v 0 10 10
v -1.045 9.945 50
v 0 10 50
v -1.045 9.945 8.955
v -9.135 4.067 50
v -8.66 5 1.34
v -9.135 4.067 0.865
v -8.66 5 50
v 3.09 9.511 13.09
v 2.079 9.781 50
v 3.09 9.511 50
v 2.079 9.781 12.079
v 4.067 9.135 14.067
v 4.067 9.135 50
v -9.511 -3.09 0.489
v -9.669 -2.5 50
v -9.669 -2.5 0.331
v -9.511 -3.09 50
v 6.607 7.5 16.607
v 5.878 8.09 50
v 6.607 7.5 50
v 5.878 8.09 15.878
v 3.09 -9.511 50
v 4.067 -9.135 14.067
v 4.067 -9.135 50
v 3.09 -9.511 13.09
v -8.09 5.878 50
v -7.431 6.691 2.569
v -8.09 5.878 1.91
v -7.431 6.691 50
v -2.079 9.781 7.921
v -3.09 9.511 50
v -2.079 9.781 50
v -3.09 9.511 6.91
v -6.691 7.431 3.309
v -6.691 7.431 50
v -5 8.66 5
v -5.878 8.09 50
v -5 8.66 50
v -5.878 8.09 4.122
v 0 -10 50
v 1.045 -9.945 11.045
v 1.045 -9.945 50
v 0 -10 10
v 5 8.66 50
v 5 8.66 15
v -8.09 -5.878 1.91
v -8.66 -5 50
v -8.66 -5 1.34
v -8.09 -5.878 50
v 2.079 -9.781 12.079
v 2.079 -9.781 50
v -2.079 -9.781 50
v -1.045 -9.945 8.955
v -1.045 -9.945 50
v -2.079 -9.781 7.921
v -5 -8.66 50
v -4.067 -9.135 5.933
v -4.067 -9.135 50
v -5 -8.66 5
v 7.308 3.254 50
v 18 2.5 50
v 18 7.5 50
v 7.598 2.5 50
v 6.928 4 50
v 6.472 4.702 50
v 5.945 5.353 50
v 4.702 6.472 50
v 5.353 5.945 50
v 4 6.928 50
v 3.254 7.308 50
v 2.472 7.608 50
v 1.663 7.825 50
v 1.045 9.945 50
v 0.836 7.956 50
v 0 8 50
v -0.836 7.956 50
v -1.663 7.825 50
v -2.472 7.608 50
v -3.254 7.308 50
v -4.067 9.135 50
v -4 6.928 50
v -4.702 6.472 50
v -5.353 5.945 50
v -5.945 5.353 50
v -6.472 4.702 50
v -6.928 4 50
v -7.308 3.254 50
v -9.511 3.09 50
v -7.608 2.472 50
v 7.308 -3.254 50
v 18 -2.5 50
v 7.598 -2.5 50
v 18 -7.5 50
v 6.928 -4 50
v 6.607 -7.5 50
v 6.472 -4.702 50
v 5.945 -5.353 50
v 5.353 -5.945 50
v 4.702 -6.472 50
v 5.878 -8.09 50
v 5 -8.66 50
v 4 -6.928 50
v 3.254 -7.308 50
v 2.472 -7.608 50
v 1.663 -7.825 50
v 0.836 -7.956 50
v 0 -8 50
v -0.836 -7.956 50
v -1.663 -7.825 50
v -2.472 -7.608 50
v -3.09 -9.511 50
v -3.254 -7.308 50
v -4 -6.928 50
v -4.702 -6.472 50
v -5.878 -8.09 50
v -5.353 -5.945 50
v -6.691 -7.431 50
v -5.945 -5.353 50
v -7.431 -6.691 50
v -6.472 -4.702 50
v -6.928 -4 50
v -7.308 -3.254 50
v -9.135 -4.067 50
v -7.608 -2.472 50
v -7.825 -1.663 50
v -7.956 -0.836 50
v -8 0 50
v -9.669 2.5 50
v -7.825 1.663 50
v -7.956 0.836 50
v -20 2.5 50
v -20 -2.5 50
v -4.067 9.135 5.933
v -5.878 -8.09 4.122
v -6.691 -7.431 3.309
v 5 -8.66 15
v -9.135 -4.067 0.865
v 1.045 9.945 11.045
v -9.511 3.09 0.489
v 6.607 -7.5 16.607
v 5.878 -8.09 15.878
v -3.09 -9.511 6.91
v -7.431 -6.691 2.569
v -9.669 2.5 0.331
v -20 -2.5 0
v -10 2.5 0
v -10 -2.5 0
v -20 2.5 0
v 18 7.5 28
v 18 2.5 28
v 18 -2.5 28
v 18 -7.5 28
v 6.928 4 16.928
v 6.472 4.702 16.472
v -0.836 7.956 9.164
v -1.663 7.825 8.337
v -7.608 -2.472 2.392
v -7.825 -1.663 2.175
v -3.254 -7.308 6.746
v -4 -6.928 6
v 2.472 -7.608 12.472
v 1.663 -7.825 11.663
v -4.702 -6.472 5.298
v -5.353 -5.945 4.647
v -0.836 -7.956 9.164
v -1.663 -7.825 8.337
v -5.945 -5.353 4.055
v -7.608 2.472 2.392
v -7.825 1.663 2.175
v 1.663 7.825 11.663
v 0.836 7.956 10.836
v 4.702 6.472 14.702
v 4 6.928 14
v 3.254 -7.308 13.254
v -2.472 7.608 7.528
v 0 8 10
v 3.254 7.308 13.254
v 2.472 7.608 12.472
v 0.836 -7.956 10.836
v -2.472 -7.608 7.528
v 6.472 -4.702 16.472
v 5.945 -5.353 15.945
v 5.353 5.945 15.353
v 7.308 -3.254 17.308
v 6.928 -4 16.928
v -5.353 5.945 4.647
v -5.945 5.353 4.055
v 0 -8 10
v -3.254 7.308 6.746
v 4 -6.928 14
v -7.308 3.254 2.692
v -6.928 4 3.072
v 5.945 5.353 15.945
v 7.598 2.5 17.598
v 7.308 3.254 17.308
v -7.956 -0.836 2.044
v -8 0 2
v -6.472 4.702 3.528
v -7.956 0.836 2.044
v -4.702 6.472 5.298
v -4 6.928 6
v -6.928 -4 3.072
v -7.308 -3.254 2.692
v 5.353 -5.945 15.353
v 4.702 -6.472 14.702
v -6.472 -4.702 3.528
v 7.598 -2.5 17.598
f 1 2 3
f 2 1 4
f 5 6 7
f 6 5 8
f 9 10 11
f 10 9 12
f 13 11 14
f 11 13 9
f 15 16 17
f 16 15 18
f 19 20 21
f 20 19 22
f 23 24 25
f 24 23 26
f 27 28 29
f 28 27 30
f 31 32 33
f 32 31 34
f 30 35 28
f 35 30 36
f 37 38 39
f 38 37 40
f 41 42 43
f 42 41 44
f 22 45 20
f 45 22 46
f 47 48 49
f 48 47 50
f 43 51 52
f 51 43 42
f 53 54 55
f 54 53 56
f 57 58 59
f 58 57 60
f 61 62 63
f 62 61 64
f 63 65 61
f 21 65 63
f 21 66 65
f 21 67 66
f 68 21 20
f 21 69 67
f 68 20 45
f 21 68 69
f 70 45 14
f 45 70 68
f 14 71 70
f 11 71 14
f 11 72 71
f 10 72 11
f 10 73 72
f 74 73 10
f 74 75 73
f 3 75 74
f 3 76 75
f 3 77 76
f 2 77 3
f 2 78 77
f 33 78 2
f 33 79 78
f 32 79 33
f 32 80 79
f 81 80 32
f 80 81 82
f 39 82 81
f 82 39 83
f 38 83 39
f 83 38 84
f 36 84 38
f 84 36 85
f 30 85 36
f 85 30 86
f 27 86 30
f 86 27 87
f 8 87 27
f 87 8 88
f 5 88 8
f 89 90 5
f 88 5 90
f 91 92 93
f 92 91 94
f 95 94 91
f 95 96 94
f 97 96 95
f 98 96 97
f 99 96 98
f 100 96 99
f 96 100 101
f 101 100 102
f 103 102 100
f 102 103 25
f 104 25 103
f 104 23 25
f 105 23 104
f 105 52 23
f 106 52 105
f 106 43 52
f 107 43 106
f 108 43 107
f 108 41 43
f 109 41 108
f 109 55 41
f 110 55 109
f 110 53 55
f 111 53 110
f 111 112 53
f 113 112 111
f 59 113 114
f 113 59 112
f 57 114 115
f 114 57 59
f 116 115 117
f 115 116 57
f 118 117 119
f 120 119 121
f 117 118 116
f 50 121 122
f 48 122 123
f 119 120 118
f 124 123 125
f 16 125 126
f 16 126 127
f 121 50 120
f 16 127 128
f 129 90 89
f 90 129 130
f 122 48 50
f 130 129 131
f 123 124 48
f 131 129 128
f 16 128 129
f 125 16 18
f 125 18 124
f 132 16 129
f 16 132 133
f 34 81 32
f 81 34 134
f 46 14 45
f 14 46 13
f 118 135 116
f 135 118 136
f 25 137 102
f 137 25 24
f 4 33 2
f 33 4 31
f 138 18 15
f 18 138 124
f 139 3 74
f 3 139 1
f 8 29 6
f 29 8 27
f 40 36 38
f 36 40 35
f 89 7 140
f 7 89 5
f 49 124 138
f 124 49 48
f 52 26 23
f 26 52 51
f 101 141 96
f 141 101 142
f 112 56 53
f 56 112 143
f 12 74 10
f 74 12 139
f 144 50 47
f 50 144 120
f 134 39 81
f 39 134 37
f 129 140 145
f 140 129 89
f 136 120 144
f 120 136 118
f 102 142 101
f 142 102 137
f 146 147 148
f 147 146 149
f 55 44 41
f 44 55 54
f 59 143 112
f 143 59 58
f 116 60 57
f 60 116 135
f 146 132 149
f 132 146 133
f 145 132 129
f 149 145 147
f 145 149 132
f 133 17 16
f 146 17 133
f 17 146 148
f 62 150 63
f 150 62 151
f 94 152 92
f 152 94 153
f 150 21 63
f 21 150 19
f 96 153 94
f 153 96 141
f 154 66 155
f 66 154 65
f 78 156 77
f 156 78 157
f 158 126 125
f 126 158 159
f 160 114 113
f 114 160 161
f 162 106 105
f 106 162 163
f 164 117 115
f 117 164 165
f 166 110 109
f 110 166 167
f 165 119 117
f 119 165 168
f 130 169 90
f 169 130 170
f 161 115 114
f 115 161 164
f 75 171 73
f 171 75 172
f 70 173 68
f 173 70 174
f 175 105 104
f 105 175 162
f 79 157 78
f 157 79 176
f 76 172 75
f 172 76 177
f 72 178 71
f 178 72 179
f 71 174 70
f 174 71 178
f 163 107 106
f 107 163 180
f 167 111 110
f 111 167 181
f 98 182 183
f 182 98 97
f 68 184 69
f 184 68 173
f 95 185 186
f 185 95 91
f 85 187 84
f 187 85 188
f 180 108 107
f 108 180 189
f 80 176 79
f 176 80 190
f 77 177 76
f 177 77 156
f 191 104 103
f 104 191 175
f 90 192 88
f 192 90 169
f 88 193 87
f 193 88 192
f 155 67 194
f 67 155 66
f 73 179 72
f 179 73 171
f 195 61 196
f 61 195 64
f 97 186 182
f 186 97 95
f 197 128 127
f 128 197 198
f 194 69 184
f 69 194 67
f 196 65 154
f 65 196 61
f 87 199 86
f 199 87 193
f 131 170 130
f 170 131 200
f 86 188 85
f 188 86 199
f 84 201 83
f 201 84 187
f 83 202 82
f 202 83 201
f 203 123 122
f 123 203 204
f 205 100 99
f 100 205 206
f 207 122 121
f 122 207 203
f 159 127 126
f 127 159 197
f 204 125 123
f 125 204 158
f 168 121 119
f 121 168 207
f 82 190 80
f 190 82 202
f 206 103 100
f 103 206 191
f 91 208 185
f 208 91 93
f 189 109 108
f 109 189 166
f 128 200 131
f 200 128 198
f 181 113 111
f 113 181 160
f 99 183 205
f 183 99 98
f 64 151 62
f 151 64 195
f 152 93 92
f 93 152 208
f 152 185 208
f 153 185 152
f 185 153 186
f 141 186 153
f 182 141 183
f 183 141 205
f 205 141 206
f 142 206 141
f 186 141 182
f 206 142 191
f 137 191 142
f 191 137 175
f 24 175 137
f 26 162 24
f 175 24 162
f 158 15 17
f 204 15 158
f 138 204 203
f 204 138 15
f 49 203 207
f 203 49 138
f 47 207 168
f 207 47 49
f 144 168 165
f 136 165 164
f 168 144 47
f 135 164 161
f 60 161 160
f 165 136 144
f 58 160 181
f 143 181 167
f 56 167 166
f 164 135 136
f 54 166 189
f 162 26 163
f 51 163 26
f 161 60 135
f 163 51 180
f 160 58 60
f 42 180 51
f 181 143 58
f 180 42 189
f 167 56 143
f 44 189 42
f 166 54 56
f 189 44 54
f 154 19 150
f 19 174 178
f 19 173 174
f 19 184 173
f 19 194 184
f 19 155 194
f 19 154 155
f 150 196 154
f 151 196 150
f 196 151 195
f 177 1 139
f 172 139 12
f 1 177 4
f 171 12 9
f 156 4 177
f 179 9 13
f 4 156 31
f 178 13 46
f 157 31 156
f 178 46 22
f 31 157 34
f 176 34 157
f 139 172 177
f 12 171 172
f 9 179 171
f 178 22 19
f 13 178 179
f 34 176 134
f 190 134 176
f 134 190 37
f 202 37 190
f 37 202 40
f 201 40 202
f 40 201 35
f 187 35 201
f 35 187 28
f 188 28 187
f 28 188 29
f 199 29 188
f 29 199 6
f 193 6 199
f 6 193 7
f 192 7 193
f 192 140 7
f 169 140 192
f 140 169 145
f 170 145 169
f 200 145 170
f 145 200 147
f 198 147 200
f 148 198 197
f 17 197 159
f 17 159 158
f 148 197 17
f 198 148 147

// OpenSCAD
// file: miscHardwareDimensions.scad
// the distance from the base of a Traxis 5347 rod end to the center of the
// ball joint.
traxxas5347BallHeight = 17;
traxxas5347HornWidth = 6.75;

stepperShaftDiameter=8;
stepperShaftFlatDepth=1;
stepperShaftFlatLength=15;
stepperShaftFlatOffset=5;
stepperShaftKeepoutDiameter=22;
stepperShaftKeepoutLength=3;
stepperGearboxDiameter=36;
stepperGearboxLength=35;
stepperInnerMountingHoleRingDiameter=28;
stepperMountingScrewDiameter=3;
stepperBodyWidth=42.3;
stepperBodyLength=48;

// guesses on dimensions
mountingScrewDepth = 8;
gearboxFlangeDepth = 5;
gearboxFlangeWidth = stepperBodyWidth - 2;
silverBorderLength = 8;

m3Diameter = 3;
m3NutDiameter = 6;
m3NutThickness = 2.4;
m3SHCSHeadDiameter = 5.5;
m3SHCSHeadHeight = 3;
m3SHCSHexSize = 2.5;
// file: dimensions.scad
//
// basic measurements of the robot
//

// radius of a circle tangent to the axes of the upper stepper motors
shoulderRadius = 50;

// radius of a circle tangent to the axes of rotation around the effector
wristRadius = 50;

// axis to axis length of the upper armature
proximalArmLength = 250;

// axis to axis length of the lower armature
distalArmLength = 288;

// width of the gap between the rod ends on the distal arm
distalArmGap = 30;

// height of center of the plane containing the stepper motors above the
// ground.
standHeight = 400;

// diameter of the printing bed
bedRadius = 150;

// fudge factor for difference operator
overcut = 1;

// clearance around holes
clearance=1.25;

// Minimum printable wall thickness (for support while printing)
minWallThickness = 0.5;

// Dimensions of the tubes comprising the tripod stand
tripodTubeDiameter = 16;
tripodTubeLength = 330;
// main file
include <dimensions.scad>
include <miscHardwareDimensions.scad>


$fn=60;

tripodTubeDiameter=16;
tripodBraceWidth=5;
tripodBraceDepth=10;
tripodTabWidth=5;
tripodTabDepth=8;
tripodBandThickness=2;
tripodBandHeight=50;
tripodSlitWidth=5;

module tripodArm() {
    difference () {
        union () {
            cylinder(r=tripodTubeDiameter/2 + tripodBandThickness,
                h=tripodBandHeight);
            translate([-tripodTubeDiameter/2 - tripodBandThickness -
                tripodBraceDepth, -tripodBraceWidth/2, 0])
                cube([tripodTubeDiameter/2 + tripodBandThickness +
                    tripodBraceDepth, tripodBraceWidth, tripodBandHeight]);
            translate([0, -tripodTabWidth - tripodSlitWidth/2, 0])
                cube([tripodTubeDiameter/2 + tripodBandThickness +
                    tripodTabDepth, tripodTabWidth*2 + tripodSlitWidth,
                    tripodBandHeight]);
        }
        union () {
            translate([0, 0, -overcut])
                cylinder(r=tripodTubeDiameter/2,
                    h=tripodBandHeight + 2*overcut);
            translate([0, -tripodSlitWidth/2, -overcut])
                cube([tripodTubeDiameter + tripodBandThickness +
                        tripodTabDepth + overcut,
                    tripodSlitWidth,
                    tripodBandHeight + 2*overcut]);
            translate([-tripodTubeDiameter/2 - tripodBandThickness,
                    -tripodTubeDiameter/2 - tripodBandThickness - overcut, 0])
                rotate([0,45,0])
                cube([100,100,100]);
        }
    }
}

module tripodHub() {
    tripodArm();
}

tripodArm();
